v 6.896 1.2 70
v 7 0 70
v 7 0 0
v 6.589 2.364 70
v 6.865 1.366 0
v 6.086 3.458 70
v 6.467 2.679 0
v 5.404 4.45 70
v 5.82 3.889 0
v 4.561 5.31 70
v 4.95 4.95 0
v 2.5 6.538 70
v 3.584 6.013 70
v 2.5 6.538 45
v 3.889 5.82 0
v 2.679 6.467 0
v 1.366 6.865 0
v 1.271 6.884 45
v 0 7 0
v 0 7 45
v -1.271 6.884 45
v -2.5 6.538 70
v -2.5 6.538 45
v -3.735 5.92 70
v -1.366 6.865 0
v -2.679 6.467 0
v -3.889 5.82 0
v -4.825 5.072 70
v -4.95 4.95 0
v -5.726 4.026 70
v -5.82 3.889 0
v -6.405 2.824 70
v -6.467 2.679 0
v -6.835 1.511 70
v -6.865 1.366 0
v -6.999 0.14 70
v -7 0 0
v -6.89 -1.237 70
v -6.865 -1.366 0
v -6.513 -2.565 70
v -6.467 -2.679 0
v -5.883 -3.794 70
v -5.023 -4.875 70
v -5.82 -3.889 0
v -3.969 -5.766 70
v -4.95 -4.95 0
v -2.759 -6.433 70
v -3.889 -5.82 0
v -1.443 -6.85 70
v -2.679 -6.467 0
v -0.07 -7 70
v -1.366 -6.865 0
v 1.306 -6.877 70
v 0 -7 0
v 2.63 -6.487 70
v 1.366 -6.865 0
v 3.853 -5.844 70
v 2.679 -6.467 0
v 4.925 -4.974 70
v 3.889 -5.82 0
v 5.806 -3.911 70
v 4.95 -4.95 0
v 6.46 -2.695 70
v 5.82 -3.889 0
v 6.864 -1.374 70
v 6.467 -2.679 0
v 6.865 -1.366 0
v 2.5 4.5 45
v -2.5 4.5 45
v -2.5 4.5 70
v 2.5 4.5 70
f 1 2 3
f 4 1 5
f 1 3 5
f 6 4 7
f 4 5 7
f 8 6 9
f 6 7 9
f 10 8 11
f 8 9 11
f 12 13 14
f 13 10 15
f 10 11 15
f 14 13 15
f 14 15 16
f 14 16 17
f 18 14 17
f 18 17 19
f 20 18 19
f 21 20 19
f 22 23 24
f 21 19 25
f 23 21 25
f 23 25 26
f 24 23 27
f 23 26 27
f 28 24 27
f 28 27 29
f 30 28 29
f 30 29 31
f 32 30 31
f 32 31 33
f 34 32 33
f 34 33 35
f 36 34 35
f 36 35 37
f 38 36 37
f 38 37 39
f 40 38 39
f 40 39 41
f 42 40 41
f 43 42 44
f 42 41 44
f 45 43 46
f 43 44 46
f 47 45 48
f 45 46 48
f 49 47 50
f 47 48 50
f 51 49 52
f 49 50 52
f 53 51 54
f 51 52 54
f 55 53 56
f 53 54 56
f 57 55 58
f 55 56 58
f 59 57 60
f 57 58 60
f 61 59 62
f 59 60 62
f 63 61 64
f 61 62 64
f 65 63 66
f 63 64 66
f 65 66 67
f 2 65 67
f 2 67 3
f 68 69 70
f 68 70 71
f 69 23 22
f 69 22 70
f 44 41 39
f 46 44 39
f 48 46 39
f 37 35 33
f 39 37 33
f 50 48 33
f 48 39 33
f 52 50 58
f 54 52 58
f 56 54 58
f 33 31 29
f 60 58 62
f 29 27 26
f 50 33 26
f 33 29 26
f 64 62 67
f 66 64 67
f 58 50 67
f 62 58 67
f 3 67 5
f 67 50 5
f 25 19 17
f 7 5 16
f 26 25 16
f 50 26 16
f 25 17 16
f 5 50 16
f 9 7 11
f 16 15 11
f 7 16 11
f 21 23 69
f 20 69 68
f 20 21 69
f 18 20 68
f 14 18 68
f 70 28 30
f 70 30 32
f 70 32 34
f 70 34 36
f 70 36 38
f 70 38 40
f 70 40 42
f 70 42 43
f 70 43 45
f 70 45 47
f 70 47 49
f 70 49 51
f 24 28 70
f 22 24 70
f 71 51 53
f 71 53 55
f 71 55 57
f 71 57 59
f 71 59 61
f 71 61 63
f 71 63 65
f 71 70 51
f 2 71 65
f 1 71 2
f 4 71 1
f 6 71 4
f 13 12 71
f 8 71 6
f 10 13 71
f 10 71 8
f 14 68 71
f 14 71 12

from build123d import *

# Parameters (mm, degrees)
SKETCH1_R           = 7
BOSS_EXTRUDE1_DEPTH = 70
CUT_EXTRUDE1_START  = -25
CUT_EXTRUDE1_DEPTH  = 25


with BuildPart() as part:
    # Sketch1 → Boss-Extrude1 (new body)
    with BuildSketch(Plane.XY):
        Circle(SKETCH1_R)
    extrude(amount=BOSS_EXTRUDE1_DEPTH)

    # Sketch2 → Cut-Extrude1 (cut)
    with BuildSketch(Plane.XY.offset(70).offset(CUT_EXTRUDE1_START)):
        with BuildLine():
            Line((-2.5, 4.5), (2.5, 4.5))
            Line((2.5, 4.5), (2.5, 6.538348415))
            ThreePointArc((2.5, 6.538348415), (0, 7), (-2.5, 6.538348415))
            Line((-2.5, 6.538348415), (-2.5, 4.5))
        make_face()
    extrude(amount=CUT_EXTRUDE1_DEPTH, mode=Mode.SUBTRACT)


solid = part.part
